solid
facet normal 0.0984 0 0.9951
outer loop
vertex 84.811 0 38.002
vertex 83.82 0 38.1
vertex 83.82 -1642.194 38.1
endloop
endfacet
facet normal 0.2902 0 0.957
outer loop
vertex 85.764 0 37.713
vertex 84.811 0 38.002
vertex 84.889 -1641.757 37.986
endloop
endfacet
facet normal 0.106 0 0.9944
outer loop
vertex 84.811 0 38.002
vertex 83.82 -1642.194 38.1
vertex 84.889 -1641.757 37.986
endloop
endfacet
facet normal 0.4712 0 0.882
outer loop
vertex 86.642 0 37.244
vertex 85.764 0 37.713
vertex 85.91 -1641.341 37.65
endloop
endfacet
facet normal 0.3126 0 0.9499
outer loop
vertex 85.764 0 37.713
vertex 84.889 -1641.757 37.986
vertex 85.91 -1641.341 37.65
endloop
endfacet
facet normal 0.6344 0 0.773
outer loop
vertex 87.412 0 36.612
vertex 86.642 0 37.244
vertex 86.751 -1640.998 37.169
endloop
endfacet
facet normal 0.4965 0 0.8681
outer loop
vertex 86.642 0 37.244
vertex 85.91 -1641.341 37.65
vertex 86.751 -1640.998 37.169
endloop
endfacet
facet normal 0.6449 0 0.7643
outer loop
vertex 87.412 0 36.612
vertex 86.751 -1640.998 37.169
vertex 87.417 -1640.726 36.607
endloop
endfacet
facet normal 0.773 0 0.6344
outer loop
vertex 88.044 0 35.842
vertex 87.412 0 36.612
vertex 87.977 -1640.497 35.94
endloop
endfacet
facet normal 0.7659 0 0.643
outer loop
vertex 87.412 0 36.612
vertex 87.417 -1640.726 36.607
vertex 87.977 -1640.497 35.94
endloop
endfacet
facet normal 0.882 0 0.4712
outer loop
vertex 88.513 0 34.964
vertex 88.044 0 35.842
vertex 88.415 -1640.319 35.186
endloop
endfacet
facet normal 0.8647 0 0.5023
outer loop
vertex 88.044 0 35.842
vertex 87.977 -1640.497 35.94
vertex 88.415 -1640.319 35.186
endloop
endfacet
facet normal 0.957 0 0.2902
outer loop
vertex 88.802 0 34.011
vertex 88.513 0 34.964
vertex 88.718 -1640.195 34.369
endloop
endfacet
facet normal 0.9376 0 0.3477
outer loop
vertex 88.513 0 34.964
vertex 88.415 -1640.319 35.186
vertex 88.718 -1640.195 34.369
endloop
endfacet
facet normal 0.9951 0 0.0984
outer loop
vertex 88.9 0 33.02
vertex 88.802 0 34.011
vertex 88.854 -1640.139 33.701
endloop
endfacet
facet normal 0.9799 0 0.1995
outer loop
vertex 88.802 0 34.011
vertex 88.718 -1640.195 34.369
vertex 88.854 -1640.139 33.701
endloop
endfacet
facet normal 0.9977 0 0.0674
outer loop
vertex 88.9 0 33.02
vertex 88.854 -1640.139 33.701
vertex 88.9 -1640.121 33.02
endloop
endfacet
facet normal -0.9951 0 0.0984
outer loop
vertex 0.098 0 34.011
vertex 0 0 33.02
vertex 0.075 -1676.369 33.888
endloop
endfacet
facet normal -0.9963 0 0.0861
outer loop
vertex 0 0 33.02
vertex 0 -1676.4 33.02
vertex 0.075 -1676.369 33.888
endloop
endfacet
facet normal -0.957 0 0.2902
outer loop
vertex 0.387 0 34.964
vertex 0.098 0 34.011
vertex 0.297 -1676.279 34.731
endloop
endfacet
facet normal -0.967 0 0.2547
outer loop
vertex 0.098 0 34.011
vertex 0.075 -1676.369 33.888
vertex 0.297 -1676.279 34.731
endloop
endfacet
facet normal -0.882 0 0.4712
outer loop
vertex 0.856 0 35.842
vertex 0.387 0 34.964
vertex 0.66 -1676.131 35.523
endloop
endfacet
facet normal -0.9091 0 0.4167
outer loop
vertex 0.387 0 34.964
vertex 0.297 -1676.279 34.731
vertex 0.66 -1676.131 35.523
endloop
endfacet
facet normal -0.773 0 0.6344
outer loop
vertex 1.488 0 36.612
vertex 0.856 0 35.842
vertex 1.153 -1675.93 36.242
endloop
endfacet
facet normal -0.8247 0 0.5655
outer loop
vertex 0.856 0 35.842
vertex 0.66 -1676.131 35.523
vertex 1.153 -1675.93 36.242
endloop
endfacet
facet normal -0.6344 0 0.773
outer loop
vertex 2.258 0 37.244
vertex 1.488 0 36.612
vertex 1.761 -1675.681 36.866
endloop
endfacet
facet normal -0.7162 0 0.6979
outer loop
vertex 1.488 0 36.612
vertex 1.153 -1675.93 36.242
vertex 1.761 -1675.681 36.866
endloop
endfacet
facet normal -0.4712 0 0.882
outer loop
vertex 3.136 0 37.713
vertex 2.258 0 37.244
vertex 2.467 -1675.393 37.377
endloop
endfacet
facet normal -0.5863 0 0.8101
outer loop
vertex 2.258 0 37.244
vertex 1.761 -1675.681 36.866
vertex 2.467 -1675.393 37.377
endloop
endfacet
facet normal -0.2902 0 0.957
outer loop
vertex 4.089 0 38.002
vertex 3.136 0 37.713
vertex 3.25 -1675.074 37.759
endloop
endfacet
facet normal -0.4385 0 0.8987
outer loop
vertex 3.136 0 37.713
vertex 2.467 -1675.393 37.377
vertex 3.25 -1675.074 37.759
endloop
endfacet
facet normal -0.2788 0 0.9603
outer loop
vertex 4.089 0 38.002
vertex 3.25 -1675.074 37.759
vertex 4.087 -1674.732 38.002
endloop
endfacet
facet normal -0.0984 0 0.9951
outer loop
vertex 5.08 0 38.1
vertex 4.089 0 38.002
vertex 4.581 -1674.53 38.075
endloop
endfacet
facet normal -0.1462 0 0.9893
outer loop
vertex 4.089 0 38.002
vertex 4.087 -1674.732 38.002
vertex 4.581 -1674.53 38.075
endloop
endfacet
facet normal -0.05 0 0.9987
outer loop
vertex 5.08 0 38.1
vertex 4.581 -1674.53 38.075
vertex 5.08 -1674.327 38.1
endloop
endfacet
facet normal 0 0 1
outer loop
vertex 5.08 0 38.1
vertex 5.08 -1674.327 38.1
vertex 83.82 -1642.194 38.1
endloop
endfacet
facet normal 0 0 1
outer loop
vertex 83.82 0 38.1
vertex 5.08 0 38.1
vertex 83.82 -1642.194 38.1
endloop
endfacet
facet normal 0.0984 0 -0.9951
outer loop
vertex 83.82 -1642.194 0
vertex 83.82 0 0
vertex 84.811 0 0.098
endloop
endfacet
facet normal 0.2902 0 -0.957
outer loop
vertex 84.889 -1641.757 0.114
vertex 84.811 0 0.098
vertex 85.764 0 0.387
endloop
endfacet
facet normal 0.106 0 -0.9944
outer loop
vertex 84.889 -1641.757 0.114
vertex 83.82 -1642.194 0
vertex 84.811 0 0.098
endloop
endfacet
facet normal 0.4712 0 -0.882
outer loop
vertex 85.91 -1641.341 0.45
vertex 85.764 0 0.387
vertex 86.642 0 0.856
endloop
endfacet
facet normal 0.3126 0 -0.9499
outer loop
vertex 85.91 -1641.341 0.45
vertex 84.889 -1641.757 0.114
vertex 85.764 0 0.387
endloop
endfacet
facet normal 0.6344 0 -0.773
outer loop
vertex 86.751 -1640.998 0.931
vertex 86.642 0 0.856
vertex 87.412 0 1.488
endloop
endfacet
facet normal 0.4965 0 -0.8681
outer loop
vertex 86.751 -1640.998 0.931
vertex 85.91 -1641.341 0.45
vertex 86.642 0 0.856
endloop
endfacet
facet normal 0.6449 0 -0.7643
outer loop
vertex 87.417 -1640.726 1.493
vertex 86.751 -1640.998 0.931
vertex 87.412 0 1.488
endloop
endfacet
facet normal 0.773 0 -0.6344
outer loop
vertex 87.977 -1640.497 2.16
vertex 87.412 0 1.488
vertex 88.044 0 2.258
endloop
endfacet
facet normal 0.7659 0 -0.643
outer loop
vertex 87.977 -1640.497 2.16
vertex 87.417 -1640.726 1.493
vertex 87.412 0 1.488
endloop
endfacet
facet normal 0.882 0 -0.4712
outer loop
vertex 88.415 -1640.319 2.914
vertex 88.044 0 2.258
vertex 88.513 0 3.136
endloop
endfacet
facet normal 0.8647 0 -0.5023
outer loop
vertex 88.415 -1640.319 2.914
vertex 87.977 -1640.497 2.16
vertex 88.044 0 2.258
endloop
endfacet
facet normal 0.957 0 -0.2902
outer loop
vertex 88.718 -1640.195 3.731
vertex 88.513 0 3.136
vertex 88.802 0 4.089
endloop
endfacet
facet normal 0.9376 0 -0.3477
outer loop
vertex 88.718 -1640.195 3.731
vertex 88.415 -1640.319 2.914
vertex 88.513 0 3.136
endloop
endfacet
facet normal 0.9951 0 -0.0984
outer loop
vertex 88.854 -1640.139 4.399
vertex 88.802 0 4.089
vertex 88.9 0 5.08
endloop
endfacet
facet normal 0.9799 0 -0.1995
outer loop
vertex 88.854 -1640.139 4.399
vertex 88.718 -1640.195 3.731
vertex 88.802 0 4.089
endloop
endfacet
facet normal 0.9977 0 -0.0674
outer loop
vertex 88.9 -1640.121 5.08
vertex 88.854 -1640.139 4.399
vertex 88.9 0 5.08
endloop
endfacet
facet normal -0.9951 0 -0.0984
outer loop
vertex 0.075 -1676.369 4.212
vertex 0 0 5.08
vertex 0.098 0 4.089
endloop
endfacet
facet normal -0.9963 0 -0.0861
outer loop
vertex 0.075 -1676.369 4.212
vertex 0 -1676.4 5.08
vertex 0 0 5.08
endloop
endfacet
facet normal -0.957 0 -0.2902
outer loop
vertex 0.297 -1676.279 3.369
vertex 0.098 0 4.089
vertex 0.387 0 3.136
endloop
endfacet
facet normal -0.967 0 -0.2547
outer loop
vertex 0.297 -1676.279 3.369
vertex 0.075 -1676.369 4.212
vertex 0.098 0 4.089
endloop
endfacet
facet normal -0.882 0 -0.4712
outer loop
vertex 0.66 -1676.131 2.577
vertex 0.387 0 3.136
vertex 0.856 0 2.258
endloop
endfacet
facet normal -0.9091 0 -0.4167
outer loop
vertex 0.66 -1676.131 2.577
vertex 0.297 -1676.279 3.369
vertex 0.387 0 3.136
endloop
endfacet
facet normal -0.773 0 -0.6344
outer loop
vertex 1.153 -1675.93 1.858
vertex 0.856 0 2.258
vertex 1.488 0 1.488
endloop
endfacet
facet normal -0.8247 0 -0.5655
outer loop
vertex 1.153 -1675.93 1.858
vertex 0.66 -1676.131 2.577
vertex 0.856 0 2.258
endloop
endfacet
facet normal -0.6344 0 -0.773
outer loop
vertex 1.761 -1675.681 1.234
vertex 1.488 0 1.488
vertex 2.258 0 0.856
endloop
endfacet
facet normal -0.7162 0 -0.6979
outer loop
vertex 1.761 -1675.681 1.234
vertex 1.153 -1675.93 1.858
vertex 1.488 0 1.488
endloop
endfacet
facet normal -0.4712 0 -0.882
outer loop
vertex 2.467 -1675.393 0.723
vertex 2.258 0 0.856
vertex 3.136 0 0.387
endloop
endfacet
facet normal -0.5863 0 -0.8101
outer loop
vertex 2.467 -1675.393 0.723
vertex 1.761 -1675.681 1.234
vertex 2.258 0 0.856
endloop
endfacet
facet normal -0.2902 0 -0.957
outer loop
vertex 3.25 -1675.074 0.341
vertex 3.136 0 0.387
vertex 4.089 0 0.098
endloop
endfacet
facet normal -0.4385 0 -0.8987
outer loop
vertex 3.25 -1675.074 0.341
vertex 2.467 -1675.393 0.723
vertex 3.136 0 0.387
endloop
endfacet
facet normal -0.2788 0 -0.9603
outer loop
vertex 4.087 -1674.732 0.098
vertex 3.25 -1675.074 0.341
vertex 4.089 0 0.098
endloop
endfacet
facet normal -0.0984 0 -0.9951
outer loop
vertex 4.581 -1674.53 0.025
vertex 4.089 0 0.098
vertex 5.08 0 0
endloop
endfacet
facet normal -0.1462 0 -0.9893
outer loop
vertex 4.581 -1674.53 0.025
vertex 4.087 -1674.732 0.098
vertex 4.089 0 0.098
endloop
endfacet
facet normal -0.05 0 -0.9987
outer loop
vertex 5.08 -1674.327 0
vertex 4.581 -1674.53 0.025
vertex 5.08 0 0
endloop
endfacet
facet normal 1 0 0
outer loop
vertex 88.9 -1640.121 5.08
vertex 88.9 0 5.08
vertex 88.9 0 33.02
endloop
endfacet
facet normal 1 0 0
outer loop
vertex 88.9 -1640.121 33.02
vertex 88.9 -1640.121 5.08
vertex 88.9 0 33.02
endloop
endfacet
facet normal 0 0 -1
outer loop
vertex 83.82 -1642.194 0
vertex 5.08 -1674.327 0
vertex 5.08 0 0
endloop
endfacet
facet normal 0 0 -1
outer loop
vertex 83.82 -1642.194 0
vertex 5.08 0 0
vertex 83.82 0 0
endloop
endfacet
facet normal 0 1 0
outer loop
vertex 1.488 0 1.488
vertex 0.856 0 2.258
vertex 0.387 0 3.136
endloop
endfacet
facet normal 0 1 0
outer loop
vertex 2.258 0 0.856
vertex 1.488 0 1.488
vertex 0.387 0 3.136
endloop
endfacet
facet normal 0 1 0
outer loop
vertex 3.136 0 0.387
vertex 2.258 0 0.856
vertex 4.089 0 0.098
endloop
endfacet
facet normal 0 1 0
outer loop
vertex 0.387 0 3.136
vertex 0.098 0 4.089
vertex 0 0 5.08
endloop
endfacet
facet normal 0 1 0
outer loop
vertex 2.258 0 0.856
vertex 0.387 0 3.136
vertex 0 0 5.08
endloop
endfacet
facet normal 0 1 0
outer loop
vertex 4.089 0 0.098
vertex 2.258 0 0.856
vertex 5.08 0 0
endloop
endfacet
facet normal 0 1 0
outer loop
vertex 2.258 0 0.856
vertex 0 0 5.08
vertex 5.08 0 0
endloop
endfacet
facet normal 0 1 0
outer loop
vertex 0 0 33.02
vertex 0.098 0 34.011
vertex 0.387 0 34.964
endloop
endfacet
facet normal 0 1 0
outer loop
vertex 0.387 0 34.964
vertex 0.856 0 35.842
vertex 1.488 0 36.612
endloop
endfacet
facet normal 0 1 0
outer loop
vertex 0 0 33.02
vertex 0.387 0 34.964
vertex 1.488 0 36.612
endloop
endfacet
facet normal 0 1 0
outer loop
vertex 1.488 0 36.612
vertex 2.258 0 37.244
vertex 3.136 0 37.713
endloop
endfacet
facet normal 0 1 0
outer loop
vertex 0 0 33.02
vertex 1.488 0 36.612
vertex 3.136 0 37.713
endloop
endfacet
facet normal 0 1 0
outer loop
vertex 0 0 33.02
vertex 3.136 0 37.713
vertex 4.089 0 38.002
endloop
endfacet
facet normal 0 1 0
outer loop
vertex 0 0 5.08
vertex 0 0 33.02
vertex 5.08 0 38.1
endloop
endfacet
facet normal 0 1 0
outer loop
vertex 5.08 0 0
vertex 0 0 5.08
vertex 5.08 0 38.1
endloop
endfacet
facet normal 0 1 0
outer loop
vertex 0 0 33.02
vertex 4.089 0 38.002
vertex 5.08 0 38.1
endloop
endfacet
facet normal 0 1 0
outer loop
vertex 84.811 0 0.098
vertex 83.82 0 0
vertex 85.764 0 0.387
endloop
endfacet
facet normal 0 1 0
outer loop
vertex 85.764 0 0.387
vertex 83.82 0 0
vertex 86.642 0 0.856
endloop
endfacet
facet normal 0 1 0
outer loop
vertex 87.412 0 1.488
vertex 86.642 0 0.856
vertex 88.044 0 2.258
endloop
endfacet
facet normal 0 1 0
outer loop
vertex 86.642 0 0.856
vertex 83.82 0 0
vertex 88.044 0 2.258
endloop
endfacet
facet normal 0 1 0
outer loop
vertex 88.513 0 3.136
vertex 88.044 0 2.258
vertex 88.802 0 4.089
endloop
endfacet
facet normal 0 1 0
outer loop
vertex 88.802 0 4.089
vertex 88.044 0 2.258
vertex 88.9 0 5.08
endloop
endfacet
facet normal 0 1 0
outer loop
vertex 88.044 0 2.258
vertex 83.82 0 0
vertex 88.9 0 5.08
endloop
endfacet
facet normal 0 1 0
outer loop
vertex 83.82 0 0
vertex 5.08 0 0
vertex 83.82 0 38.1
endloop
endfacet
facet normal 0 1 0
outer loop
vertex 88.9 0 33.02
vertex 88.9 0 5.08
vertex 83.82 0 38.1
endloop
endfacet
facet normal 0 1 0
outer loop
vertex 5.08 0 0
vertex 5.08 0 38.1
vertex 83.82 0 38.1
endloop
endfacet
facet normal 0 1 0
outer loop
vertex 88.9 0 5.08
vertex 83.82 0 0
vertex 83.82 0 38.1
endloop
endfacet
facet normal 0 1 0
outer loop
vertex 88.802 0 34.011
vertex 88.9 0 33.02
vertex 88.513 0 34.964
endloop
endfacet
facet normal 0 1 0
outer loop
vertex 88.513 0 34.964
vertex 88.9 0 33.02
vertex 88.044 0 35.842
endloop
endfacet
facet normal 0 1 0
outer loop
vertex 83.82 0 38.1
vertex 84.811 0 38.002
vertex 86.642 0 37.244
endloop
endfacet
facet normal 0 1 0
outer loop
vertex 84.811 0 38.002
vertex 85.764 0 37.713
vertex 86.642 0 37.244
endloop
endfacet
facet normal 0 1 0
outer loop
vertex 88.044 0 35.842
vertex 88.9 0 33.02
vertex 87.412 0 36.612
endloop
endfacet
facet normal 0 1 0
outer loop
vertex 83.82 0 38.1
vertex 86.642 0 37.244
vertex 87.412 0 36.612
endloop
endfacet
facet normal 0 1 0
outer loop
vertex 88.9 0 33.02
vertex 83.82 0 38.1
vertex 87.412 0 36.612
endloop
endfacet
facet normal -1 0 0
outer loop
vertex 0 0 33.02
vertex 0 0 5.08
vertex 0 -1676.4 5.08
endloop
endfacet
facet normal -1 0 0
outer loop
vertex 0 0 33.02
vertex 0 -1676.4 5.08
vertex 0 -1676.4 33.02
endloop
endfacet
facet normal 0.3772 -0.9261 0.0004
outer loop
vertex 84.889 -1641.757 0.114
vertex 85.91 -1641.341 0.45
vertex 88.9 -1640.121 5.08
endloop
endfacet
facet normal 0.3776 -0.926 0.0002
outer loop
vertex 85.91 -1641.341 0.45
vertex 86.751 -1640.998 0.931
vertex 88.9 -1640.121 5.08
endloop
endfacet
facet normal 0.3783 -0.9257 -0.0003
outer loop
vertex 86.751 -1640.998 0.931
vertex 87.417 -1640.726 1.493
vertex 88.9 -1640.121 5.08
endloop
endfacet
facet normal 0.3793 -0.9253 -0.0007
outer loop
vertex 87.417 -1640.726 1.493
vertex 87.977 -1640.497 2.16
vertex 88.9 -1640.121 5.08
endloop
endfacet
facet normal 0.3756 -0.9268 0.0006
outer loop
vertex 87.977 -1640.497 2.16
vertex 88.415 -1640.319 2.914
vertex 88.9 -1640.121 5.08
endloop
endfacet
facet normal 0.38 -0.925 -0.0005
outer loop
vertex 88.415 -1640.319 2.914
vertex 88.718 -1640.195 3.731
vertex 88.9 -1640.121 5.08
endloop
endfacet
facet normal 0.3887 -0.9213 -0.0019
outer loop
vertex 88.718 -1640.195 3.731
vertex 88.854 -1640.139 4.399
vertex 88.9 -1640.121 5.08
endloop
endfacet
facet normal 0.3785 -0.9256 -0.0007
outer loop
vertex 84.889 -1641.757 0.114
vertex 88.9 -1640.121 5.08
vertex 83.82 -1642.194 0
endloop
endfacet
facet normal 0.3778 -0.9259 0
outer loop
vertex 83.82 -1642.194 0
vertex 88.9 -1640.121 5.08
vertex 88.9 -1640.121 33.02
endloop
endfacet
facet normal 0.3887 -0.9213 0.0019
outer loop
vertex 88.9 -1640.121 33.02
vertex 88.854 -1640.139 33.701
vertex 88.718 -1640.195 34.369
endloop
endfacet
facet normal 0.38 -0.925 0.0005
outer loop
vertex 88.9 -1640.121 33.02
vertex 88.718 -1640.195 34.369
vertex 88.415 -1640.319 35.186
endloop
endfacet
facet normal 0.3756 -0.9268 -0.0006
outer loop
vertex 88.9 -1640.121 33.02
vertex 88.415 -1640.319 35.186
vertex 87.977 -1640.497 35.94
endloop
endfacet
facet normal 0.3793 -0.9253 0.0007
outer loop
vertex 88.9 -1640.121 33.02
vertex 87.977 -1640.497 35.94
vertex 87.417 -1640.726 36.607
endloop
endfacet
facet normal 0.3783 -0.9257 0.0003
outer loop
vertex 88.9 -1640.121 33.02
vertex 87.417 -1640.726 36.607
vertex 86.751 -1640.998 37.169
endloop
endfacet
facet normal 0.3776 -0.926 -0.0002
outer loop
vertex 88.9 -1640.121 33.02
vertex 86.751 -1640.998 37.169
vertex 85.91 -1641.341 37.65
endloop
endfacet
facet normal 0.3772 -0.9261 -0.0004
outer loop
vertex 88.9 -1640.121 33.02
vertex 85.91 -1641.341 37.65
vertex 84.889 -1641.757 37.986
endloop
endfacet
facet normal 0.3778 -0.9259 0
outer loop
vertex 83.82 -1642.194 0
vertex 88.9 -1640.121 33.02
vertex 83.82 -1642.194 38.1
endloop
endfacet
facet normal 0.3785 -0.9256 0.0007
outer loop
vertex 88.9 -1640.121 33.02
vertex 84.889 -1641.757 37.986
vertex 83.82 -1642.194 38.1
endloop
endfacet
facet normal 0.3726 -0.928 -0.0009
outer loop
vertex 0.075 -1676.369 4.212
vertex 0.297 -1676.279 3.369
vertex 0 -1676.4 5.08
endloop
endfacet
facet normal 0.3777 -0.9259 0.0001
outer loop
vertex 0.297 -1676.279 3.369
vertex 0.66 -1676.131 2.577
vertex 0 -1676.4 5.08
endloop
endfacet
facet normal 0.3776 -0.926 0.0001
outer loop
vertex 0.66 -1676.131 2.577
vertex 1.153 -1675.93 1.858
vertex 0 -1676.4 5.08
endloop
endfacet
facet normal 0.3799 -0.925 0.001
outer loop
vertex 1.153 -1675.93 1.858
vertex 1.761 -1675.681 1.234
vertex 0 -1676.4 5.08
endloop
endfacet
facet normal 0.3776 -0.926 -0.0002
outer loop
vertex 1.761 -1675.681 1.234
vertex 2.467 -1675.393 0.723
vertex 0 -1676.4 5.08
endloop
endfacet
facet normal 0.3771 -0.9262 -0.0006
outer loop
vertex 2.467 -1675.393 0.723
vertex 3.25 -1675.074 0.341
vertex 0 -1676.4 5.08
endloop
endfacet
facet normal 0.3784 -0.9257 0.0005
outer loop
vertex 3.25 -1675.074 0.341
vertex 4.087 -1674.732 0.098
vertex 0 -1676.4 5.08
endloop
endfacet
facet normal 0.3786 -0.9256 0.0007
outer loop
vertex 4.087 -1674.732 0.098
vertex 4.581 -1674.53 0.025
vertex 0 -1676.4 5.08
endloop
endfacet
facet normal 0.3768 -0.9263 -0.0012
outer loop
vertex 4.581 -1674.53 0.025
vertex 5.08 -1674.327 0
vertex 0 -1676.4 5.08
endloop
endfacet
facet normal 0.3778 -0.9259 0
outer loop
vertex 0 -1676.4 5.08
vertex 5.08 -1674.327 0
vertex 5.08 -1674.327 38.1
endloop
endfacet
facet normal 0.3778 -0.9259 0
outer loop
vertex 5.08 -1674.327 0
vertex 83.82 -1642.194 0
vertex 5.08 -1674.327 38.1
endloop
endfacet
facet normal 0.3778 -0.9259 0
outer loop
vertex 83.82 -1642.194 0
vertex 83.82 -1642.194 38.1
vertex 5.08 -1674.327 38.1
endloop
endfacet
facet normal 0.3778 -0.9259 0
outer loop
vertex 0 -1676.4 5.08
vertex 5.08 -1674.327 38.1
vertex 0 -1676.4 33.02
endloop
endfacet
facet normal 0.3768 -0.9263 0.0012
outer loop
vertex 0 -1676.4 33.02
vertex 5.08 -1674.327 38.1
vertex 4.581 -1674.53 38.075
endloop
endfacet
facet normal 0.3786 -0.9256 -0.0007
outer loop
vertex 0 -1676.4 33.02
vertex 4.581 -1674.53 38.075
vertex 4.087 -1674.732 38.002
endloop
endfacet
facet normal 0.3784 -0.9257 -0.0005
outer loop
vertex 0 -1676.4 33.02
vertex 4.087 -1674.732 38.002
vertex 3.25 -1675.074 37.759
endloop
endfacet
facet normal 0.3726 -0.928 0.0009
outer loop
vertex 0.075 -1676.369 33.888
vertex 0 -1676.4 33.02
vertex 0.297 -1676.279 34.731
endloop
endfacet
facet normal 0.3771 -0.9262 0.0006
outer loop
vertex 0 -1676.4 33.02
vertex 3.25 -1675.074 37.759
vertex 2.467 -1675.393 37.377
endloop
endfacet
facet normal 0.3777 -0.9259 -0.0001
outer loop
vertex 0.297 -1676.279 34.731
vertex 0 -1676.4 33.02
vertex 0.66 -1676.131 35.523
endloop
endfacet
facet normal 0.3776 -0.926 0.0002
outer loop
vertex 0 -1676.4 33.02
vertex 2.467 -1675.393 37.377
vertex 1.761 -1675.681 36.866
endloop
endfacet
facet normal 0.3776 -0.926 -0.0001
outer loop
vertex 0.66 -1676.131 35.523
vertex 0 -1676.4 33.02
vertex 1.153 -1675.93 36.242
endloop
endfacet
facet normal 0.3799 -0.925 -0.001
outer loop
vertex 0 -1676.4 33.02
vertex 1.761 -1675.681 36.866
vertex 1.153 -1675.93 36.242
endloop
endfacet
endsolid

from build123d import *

# Parameters (mm, degrees)
F0_W     = 88.9
F0_H     = 38.1
F1_DEPTH = 1676.4
F3_DEPTH = 84.074
F4_R     = 5.08


with BuildPart() as f1:
    # F0 (on Front) → F1 (new body)
    with BuildSketch(Plane.XZ):
        with Locations((44.45, 19.05)):
            Rectangle(F0_W, F0_H)
    extrude(amount=F1_DEPTH)

    # F2 (on face) → F3 (cut)
    with BuildSketch(Plane.XY.offset(38.1)):
        Polygon((88.9, -1640.120582), (0, -1676.4), (88.9, -1676.4), align=None)
    extrude(amount=-F3_DEPTH, mode=Mode.SUBTRACT)

    # F4
    f4_edges = [f1.edges().sort_by_distance(p)[0] for p in [
        (0, -838.2, 38.1),
        (88.9, -820.060291, 38.1),
        (0, -838.2, 0),
        (88.9, -820.060291, 0),
    ]]
    fillet(f4_edges, radius=F4_R)


solid = f1.part
